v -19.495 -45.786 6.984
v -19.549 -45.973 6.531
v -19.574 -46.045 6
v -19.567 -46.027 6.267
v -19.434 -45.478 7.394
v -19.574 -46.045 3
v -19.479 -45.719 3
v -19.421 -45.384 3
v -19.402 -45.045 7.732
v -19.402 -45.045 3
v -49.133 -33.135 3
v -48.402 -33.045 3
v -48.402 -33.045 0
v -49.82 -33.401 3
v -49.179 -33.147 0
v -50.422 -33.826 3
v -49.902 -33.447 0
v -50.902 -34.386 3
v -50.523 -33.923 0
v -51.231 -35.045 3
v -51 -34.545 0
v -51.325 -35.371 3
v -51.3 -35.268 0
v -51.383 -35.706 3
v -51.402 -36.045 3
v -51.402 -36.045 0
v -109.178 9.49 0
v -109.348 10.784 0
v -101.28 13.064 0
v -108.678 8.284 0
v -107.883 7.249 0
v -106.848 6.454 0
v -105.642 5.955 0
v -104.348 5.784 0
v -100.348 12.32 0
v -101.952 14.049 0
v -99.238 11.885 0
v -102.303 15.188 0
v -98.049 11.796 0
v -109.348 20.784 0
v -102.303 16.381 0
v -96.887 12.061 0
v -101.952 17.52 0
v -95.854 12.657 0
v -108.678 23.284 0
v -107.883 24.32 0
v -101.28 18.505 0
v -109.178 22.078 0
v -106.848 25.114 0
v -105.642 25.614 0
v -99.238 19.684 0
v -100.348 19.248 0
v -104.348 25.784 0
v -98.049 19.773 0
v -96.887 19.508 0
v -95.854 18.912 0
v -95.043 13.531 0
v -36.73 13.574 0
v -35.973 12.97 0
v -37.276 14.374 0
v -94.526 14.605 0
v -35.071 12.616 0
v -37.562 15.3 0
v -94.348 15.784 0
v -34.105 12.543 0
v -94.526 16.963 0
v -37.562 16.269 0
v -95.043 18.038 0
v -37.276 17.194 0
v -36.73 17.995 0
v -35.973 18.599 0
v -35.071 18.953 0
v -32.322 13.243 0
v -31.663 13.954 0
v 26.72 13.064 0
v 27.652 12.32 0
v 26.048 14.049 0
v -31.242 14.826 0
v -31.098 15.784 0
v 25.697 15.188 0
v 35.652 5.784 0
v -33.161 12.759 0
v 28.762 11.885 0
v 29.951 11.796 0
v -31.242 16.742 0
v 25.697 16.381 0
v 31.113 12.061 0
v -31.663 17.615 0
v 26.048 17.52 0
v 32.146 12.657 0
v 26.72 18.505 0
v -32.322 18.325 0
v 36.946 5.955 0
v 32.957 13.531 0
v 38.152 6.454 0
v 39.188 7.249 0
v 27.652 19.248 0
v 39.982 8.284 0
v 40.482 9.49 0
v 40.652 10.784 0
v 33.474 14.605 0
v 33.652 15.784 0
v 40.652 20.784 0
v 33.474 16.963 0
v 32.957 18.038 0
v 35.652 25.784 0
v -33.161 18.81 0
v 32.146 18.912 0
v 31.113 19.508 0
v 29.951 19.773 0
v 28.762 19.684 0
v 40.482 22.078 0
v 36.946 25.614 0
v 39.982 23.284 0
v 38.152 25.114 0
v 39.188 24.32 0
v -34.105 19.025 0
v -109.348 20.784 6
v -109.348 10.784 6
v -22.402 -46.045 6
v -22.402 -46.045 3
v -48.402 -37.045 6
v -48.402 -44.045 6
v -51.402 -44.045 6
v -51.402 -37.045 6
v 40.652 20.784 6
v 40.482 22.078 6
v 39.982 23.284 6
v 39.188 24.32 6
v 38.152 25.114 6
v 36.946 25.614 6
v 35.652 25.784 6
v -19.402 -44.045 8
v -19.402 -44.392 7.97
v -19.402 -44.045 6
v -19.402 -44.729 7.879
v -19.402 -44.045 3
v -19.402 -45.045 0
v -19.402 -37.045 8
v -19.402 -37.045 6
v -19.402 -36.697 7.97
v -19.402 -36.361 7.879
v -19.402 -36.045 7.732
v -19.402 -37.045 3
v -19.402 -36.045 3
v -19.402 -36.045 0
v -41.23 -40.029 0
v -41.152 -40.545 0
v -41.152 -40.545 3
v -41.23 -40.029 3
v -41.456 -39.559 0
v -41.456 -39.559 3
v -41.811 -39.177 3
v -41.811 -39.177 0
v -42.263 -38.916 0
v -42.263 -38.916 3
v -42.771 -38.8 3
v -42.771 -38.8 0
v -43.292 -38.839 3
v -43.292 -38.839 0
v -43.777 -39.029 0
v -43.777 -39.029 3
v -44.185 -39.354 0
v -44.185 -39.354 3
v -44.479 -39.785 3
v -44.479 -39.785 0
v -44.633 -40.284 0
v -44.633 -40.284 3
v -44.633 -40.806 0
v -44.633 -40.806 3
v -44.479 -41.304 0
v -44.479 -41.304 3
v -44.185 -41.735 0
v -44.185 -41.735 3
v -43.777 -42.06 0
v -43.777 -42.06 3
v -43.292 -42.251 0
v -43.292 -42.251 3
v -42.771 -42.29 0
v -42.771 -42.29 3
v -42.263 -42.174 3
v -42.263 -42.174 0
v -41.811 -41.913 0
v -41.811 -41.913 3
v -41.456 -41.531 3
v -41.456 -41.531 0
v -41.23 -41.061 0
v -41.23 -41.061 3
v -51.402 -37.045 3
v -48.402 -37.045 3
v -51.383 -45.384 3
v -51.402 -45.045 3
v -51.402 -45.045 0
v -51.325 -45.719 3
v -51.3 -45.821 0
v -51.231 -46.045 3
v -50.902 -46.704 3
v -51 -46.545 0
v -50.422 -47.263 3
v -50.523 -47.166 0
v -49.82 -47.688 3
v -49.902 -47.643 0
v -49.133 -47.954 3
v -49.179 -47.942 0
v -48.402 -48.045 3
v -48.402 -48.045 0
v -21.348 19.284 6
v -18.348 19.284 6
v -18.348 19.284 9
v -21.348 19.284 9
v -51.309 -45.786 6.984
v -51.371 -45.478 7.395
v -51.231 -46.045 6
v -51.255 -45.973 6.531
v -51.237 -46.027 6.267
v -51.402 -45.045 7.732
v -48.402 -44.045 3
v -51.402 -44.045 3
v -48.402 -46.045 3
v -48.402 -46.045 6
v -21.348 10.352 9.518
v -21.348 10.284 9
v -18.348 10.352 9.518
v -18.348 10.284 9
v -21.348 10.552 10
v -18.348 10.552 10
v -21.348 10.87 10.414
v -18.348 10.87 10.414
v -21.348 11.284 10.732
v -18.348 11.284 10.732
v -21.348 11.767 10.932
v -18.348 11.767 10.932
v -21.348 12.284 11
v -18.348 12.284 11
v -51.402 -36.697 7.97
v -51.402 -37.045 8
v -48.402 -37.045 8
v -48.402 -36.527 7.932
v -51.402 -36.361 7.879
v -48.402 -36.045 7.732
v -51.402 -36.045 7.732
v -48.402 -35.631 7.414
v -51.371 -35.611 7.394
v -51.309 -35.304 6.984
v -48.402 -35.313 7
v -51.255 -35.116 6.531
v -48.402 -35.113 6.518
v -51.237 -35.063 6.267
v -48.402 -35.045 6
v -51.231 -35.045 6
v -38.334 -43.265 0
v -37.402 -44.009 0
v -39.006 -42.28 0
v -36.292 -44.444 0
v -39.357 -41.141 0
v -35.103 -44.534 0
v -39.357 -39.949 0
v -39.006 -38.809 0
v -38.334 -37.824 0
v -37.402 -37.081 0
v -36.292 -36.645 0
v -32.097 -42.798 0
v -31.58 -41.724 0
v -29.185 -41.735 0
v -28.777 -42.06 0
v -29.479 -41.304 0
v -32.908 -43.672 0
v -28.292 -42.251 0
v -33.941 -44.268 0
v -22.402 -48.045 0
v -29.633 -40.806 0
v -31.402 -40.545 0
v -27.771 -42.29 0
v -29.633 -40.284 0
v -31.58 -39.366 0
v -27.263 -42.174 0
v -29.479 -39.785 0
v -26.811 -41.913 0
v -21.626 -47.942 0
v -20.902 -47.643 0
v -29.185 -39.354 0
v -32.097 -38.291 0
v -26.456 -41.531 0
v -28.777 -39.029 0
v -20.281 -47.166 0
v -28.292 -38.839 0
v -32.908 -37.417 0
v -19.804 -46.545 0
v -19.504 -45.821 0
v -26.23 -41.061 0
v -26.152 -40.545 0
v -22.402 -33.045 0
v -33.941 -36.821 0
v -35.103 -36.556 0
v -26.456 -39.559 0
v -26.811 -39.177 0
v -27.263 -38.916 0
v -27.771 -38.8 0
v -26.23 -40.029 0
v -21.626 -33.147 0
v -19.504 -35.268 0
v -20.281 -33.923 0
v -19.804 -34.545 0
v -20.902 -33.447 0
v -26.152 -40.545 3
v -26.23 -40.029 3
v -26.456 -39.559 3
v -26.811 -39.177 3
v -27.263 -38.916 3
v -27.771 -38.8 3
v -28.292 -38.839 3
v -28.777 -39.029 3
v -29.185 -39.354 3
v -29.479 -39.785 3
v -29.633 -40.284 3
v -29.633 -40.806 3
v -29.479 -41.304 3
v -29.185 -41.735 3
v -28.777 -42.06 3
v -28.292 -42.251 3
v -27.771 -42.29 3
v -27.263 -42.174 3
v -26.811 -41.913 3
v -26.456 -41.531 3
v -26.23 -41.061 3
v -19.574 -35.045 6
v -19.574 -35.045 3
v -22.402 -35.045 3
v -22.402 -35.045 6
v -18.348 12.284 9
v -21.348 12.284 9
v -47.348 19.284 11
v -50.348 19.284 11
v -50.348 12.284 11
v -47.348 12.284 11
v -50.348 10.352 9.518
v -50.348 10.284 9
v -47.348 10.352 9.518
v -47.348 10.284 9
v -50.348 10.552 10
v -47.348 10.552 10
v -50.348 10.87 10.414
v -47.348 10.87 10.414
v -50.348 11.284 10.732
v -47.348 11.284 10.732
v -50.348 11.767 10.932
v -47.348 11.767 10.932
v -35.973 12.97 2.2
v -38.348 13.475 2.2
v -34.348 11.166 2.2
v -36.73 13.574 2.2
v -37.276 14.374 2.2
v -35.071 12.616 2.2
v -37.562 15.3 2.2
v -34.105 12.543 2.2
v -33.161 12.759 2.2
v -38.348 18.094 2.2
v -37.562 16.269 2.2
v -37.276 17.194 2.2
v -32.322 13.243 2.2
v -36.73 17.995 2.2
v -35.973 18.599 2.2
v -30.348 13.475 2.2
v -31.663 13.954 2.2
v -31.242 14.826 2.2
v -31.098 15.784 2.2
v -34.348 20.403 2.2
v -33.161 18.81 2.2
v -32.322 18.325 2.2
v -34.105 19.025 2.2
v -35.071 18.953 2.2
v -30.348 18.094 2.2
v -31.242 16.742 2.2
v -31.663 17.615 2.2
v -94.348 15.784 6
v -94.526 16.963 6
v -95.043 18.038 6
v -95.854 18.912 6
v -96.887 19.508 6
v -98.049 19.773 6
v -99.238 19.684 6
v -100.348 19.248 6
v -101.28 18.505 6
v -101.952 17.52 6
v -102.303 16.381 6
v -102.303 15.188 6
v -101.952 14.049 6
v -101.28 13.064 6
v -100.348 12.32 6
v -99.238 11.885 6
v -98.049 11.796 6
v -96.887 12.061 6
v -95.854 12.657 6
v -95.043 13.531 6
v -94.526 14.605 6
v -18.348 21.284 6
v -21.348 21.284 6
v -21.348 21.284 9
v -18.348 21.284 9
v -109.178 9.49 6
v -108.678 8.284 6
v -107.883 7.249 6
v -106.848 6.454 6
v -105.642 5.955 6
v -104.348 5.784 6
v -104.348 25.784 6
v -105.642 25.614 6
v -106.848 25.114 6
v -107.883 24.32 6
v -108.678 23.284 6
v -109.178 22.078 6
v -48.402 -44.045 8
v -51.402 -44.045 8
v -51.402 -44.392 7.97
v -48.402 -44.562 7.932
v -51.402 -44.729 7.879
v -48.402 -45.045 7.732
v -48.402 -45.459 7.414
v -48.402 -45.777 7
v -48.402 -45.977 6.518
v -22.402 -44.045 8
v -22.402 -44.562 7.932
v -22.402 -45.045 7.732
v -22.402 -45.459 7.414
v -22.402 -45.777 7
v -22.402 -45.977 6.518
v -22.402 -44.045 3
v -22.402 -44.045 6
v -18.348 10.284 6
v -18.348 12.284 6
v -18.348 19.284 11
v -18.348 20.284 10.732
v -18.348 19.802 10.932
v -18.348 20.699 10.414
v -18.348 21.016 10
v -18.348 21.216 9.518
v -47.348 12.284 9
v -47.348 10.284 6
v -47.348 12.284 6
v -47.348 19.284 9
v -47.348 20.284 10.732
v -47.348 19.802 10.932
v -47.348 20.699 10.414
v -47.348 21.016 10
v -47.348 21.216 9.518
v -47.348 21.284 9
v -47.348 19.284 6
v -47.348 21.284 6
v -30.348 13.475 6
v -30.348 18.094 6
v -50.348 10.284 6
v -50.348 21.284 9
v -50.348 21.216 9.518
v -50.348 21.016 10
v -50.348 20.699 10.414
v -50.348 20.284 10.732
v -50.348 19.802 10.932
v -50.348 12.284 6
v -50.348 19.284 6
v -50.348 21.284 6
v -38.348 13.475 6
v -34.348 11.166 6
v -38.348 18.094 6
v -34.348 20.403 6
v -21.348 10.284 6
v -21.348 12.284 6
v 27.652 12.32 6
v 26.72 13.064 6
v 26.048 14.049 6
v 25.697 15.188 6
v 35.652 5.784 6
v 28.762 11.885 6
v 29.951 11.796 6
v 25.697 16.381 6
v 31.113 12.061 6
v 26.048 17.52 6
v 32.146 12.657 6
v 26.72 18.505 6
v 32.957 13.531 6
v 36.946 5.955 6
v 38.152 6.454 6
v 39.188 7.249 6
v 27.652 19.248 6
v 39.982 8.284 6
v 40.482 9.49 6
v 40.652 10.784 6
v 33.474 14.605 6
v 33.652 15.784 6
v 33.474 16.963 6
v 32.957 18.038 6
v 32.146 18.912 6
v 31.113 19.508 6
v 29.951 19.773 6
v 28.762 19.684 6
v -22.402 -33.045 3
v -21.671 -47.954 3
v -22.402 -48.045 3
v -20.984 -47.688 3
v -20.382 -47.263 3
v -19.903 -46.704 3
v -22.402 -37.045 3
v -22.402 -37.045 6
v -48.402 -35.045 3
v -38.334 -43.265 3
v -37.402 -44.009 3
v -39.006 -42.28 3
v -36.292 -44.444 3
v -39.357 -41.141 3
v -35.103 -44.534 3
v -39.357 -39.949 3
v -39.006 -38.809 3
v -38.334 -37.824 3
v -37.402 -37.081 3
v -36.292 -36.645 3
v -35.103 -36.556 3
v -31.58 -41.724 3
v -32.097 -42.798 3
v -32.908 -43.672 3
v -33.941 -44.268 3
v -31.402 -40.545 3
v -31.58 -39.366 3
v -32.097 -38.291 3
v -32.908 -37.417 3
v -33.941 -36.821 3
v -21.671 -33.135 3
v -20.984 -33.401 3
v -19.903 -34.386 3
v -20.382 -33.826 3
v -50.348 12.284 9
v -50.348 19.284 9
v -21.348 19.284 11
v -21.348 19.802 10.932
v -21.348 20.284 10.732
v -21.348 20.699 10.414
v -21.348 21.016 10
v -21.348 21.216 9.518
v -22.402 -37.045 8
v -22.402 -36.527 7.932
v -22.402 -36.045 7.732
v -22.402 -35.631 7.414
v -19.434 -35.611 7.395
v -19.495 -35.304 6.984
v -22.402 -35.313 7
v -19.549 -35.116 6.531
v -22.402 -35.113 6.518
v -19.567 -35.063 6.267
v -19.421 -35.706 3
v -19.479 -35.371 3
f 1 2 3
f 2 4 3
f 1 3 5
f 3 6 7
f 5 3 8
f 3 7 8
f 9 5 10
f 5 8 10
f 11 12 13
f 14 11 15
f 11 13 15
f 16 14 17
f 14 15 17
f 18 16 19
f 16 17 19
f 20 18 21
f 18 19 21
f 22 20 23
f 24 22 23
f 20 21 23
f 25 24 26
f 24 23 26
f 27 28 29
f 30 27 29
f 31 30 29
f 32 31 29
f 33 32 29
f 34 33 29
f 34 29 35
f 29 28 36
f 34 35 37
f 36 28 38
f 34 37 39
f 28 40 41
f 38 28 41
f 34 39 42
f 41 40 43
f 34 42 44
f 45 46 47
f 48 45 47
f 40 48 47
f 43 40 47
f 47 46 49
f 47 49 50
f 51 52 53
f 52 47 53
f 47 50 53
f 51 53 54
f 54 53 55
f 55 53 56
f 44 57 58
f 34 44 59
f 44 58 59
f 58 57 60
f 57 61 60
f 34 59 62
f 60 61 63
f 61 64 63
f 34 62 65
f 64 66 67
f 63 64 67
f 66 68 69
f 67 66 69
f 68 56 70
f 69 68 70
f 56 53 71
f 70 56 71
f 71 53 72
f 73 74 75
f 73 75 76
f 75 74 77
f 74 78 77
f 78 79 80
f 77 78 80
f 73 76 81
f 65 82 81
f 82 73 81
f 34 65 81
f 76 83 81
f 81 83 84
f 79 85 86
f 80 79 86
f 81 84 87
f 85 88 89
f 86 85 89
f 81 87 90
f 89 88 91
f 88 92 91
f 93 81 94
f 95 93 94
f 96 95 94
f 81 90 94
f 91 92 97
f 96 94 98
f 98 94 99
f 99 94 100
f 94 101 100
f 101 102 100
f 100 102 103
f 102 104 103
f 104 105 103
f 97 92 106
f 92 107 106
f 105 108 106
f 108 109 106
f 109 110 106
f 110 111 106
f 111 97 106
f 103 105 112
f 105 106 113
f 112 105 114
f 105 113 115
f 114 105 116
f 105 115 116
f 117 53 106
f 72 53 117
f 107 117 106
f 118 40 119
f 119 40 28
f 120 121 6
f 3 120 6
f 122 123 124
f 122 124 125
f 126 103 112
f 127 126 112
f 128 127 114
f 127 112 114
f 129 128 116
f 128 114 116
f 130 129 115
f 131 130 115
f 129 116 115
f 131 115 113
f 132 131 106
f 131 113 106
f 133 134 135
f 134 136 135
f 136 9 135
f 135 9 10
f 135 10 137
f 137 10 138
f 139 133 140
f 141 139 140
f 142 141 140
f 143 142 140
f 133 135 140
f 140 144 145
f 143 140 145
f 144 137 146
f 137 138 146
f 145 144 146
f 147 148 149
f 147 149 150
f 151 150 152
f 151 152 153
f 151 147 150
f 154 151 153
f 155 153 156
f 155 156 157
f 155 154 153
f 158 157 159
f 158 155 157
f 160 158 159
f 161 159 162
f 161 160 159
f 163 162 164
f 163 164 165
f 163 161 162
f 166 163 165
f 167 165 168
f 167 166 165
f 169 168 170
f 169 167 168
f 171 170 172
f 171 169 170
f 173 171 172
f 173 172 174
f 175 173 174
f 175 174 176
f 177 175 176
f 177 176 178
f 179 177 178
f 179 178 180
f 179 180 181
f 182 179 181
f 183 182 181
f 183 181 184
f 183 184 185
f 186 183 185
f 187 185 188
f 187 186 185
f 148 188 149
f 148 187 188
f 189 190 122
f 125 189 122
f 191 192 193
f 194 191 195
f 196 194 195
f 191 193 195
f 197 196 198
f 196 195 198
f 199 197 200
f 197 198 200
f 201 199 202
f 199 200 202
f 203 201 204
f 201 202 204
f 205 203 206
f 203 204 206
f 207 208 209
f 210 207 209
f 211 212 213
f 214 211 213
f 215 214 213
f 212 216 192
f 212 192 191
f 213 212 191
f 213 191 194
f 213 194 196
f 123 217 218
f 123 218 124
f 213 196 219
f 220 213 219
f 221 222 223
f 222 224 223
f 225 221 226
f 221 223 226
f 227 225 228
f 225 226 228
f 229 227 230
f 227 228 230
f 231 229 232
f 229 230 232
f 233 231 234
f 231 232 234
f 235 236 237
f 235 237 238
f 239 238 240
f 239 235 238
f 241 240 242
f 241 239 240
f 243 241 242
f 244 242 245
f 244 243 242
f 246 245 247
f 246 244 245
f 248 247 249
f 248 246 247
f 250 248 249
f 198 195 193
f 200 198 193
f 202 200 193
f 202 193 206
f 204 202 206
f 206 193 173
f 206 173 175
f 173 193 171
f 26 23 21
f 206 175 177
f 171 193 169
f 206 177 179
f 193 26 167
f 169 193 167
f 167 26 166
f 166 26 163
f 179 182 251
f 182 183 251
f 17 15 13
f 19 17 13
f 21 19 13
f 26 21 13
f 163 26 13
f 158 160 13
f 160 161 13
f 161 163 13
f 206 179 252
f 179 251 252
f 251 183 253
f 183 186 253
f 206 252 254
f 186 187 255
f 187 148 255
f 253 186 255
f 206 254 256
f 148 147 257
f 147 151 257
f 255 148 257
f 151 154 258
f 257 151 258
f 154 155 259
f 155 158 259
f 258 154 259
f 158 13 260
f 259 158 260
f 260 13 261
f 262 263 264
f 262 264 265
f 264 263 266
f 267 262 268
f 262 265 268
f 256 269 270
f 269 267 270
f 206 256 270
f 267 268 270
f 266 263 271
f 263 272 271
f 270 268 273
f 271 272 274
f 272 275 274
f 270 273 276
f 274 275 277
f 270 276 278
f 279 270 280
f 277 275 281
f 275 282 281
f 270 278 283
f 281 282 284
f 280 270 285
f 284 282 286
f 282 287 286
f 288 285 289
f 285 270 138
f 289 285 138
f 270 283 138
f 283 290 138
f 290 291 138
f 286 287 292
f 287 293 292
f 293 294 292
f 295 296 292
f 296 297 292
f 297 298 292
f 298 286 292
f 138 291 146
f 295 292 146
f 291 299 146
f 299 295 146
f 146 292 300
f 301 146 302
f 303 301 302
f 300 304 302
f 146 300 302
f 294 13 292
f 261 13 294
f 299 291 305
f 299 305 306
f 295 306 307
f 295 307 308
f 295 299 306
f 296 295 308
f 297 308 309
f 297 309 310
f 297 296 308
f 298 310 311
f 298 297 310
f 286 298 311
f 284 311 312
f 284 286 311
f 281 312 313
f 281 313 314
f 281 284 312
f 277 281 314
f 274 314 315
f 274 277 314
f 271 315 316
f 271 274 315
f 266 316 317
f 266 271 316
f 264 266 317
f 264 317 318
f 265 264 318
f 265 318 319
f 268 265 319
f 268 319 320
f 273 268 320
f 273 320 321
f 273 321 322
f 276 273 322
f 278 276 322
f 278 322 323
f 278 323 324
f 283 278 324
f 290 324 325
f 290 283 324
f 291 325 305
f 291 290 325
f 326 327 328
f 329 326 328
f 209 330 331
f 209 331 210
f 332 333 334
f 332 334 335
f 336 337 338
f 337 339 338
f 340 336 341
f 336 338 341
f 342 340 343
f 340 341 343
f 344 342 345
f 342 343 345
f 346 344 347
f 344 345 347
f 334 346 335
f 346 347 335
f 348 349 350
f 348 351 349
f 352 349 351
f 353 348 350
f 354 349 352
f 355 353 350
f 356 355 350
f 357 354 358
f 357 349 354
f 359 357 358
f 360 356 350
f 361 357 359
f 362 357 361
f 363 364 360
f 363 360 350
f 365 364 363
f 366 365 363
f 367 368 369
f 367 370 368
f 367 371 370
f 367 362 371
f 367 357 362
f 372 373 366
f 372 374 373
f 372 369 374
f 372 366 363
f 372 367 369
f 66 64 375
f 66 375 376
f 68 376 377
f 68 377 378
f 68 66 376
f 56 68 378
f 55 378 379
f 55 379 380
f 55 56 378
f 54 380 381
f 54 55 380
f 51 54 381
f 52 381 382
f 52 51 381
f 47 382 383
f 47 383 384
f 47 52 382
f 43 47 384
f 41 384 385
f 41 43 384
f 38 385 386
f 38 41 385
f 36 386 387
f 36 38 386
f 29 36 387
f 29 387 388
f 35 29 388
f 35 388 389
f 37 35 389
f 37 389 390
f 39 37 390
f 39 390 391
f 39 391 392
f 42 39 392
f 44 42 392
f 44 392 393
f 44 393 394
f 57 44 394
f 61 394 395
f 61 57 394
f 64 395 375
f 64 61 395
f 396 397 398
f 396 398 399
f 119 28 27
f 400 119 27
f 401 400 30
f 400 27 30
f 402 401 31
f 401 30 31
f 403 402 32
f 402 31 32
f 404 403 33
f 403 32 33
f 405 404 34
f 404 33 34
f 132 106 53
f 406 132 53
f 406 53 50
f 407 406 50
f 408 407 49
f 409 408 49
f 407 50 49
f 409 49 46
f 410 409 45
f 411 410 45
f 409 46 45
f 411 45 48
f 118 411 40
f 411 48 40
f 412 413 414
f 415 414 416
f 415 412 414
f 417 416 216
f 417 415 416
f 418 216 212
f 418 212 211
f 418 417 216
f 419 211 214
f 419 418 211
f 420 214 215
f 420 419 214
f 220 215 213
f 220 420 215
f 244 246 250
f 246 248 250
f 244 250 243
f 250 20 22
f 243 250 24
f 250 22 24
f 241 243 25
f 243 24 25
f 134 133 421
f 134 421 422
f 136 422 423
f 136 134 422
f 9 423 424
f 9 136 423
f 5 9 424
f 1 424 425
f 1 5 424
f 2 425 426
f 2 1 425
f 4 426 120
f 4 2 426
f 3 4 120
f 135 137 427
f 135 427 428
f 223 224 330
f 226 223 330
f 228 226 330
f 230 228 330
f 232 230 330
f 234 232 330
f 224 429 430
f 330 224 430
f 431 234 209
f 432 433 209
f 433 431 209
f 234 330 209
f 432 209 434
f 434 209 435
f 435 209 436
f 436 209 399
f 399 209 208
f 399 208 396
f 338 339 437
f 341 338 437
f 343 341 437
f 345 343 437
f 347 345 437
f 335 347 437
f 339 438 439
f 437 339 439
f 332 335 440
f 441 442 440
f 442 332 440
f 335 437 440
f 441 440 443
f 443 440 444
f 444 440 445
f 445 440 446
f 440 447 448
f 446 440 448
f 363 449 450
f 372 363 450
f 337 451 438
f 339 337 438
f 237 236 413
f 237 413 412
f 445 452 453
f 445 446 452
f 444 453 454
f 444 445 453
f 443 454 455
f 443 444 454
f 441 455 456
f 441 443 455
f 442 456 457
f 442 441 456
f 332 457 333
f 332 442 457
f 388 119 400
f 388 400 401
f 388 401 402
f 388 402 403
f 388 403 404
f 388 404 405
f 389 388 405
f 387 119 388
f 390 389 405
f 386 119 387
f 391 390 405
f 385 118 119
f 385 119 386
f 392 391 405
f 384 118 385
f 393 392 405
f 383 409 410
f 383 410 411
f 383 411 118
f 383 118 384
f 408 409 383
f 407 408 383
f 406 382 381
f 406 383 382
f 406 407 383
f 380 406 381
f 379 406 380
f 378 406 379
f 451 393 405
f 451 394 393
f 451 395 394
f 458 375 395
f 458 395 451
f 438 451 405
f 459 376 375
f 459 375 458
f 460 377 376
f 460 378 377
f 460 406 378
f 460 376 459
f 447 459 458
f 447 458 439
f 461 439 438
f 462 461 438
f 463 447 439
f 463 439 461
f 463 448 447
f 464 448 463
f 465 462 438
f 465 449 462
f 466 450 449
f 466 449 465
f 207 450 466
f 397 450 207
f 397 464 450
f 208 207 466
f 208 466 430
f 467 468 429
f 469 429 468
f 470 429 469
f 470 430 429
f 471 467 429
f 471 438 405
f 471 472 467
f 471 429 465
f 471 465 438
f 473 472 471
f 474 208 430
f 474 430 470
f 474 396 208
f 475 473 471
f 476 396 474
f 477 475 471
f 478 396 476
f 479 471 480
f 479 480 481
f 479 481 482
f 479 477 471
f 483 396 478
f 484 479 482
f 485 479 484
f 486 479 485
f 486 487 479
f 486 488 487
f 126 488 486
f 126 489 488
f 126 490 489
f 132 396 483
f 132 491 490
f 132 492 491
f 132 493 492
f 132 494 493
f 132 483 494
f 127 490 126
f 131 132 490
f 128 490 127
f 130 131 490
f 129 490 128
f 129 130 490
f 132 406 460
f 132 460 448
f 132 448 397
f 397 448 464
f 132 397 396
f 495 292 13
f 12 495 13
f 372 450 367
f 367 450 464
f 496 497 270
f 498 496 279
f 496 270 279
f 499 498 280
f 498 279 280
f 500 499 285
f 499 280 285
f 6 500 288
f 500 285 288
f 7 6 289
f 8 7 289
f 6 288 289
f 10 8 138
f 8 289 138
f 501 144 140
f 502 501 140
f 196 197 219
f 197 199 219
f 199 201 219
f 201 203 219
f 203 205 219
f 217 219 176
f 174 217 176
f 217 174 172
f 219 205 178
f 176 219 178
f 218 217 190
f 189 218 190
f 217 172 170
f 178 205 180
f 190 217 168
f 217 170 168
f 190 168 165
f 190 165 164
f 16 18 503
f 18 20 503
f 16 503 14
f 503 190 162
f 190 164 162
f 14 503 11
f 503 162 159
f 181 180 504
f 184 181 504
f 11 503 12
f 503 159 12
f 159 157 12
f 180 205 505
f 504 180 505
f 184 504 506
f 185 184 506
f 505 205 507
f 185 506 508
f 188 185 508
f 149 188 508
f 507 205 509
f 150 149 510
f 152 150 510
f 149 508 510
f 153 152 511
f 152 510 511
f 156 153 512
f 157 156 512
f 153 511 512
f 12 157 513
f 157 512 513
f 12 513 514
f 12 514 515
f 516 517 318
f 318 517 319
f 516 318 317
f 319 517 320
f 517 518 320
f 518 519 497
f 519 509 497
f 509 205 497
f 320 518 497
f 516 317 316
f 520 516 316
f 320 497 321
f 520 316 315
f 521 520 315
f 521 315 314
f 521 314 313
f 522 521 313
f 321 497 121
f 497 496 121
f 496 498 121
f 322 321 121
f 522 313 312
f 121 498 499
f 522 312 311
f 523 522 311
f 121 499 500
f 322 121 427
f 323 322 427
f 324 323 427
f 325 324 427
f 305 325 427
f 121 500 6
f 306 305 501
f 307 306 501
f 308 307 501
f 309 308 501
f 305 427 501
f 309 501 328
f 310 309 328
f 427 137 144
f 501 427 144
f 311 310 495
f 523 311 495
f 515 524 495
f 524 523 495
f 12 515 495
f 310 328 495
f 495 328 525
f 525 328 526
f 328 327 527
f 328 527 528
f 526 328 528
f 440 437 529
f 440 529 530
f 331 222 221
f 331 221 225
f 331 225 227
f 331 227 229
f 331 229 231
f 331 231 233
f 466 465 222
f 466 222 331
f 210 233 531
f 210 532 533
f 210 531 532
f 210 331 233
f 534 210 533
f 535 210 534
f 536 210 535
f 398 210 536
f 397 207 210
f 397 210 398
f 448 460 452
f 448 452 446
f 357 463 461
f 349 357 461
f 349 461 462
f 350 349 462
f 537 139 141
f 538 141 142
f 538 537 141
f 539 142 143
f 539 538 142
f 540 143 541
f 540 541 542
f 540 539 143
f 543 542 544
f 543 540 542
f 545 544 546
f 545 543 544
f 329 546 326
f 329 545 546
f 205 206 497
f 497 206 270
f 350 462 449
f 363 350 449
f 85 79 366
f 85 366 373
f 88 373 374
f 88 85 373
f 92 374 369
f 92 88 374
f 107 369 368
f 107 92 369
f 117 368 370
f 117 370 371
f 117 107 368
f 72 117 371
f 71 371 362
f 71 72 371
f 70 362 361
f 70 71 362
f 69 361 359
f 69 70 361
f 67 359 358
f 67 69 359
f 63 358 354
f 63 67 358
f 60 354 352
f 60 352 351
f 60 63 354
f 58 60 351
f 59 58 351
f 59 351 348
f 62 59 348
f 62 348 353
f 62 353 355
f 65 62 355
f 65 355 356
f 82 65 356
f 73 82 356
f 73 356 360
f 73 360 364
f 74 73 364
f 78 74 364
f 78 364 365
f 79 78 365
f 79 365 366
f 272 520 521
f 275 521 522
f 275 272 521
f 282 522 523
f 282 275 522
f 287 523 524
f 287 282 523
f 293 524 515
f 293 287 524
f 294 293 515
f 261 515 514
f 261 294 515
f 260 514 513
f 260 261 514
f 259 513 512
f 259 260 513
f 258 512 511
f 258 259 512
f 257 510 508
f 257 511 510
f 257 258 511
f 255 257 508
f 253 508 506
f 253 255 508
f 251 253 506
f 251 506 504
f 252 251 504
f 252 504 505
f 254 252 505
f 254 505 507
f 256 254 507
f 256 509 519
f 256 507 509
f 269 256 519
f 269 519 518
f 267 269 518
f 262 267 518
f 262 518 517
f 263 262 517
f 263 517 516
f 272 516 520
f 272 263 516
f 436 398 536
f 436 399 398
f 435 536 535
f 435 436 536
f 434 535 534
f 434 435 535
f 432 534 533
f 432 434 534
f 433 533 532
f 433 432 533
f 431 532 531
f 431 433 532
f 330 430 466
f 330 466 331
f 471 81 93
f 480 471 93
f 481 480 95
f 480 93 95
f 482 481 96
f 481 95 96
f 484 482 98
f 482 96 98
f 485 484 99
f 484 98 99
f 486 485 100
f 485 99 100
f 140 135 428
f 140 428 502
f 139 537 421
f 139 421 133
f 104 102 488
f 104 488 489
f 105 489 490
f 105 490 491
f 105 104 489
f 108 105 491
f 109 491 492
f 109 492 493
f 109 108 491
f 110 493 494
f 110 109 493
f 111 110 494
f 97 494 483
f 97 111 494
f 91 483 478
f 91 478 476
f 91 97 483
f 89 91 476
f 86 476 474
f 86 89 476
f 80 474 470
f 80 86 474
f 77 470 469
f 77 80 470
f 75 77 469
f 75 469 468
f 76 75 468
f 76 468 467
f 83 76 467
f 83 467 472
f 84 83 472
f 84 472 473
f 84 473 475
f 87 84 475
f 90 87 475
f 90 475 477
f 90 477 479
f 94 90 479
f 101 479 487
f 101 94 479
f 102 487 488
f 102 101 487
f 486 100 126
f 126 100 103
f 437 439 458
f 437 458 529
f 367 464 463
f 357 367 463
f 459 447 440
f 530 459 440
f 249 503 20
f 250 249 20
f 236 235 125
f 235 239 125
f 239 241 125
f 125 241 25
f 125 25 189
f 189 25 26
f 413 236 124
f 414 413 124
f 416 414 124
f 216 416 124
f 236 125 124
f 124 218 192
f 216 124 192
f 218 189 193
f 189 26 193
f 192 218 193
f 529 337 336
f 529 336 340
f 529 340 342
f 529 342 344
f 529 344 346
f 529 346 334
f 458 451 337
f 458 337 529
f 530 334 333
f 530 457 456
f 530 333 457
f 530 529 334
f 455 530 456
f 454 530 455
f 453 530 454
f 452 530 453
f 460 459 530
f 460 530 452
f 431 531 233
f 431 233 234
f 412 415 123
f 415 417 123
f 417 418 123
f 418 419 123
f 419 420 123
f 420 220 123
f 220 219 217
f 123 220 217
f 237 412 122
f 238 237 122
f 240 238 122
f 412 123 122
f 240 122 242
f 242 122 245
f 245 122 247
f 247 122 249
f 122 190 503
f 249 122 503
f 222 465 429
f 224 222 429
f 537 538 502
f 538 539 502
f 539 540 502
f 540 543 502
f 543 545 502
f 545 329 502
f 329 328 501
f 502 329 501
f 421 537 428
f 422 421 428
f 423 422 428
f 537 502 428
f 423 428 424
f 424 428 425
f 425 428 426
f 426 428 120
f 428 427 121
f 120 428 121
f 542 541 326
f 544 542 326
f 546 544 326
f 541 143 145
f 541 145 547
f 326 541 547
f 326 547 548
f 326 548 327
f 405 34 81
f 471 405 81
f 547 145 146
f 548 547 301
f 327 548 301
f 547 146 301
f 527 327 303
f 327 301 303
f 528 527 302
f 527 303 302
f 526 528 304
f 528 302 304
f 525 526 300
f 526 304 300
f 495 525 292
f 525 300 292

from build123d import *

# Parameters (mm, degrees)
F0_R      = 4
F0_R_2    = 3.25
F1_DEPTH  = 6
F2_R      = 3.25
F3_DEPTH  = 3.8
F2_W      = 3
F2_H      = 11
F4_DEPTH  = 5
F5_R      = 2
F6_W      = 7
F6_H      = 3
F7_DEPTH  = 35
F8_R      = 1.75
F8_R_2    = 4
F9_DEPTH  = 3
F11_DEPTH = 5
F12_W     = 7
F12_H     = 3
F13_DEPTH = 35
F14_R     = 2


with BuildPart() as f1:
    # F0 (on Top) → F1 (new body)
    with BuildSketch(Plane.XY):
        with BuildLine():
            Line((35.652044, 25.784345), (-104.347956, 25.784345))
            ThreePointArc((-104.347956, 25.784345), (-107.88349, 24.319879), (-109.347956, 20.784345))
            Line((-109.347956, 20.784345), (-109.347956, 10.784345))
            ThreePointArc((-109.347956, 10.784345), (-107.88349, 7.248811), (-104.347956, 5.784345))
            Line((-104.347956, 5.784345), (35.652044, 5.784345))
            ThreePointArc((35.652044, 5.784345), (39.187578, 7.248811), (40.652044, 10.784345))
            Line((40.652044, 10.784345), (40.652044, 20.784345))
            ThreePointArc((40.652044, 20.784345), (39.187578, 24.319879), (35.652044, 25.784345))
        make_face()
        with Locations((-98.347956, 15.784345)):
            Circle(F0_R, mode=Mode.SUBTRACT)
        with Locations((-34.347956, 15.784345)):
            Circle(F0_R_2, mode=Mode.SUBTRACT)
        with Locations((29.652044, 15.784345)):
            Circle(F0_R, mode=Mode.SUBTRACT)
    extrude(amount=F1_DEPTH)

    # F2 (on face) → F3 (cut)
    with BuildSketch(Plane.XY.offset(6)):
        Polygon((-30.347956, 13.474944), (-30.347956, 18.093746), (-34.347956, 20.403147), (-38.347956, 18.093746), (-38.347956, 13.474944), (-34.347956, 11.165543), align=None)
        with Locations((-34.347956, 15.784345)):
            Circle(F2_R, mode=Mode.SUBTRACT)
    extrude(amount=-F3_DEPTH, mode=Mode.SUBTRACT)

    # F2 (on face) → F4 (join)
    with BuildSketch(Plane.XY.offset(6)):
        with Locations((-19.847956, 15.784345)):
            Rectangle(F2_W, F2_H)
        with Locations((-48.847956, 15.784345)):
            Rectangle(F2_W, F2_H)
    extrude(amount=F4_DEPTH)

    # F5
    f5_edges = [f1.edges().sort_by_distance(p)[0] for p in [
        (-19.847956, 21.284345, 11),
        (-19.847956, 10.284345, 11),
        (-48.847956, 21.284345, 11),
        (-48.847956, 10.284345, 11),
    ]]
    fillet(f5_edges, radius=F5_R)

    # F6 (on face) → F7 (cut)
    with BuildSketch(Plane.YZ.offset(-18.347956)):
        with Locations((15.784345, 7.5)):
            Rectangle(F6_W, F6_H)
    extrude(amount=-F7_DEPTH, mode=Mode.SUBTRACT)


with BuildPart() as f9:
    # F8 (on Top) → F9 (new body)
    with BuildSketch(Plane.XY):
        with BuildLine():
            Line((-22.402144, -33.044718), (-48.402144, -33.044718))
            ThreePointArc((-48.402144, -33.044718), (-50.523464, -33.923398), (-51.402144, -36.044718))
            Line((-51.402144, -36.044718), (-51.402144, -45.044718))
            ThreePointArc((-51.402144, -45.044718), (-50.523464, -47.166039), (-48.402144, -48.044718))
            Line((-48.402144, -48.044718), (-22.402144, -48.044718))
            ThreePointArc((-22.402144, -48.044718), (-20.280824, -47.166039), (-19.402144, -45.044718))
            Line((-19.402144, -45.044718), (-19.402144, -36.044718))
            ThreePointArc((-19.402144, -36.044718), (-20.280824, -33.923398), (-22.402144, -33.044718))
        make_face()
        with Locations((-42.902144, -40.544718)):
            Circle(F8_R, mode=Mode.SUBTRACT)
        with Locations((-35.402144, -40.544718)):
            Circle(F8_R_2, mode=Mode.SUBTRACT)
        with Locations((-27.902144, -40.544718)):
            Circle(F8_R, mode=Mode.SUBTRACT)
    extrude(amount=F9_DEPTH)

    # F10 (on face) → F11 (join)
    with BuildSketch(Plane.XY.offset(3)):
        with BuildLine():
            ThreePointArc((-19.402144, -36.044718), (-19.445348, -35.537413), (-19.573717, -35.044718))
            Line((-19.573717, -35.044718), (-22.402144, -35.044718))
            Line((-22.402144, -35.044718), (-22.402144, -46.044718))
            Line((-22.402144, -46.044718), (-19.573717, -46.044718))
            ThreePointArc((-19.573717, -46.044718), (-19.445348, -45.552024), (-19.402144, -45.044718))
            Line((-19.402144, -45.044718), (-19.402144, -36.044718))
        make_face()
        with BuildLine():
            Line((-48.402144, -35.044718), (-51.230571, -35.044718))
            ThreePointArc((-51.230571, -35.044718), (-51.35894, -35.537413), (-51.402144, -36.044718))
            Line((-51.402144, -36.044718), (-51.402144, -45.044718))
            ThreePointArc((-51.402144, -45.044718), (-51.35894, -45.552024), (-51.230571, -46.044718))
            Line((-51.230571, -46.044718), (-48.402144, -46.044718))
            Line((-48.402144, -46.044718), (-48.402144, -35.044718))
        make_face()
    extrude(amount=F11_DEPTH)

    # F12 (on face) → F13 (cut)
    with BuildSketch(Plane.YZ.offset(-19.402144)):
        with Locations((-40.544718, 4.5)):
            Rectangle(F12_W, F12_H)
    extrude(amount=-F13_DEPTH, mode=Mode.SUBTRACT)

    # F14
    f14_edges = [f9.edges().sort_by_distance(p)[0] for p in [
        (-20.987931, -46.044718, 8),
        (-49.816358, -46.044718, 8),
        (-49.816358, -35.044718, 8),
        (-20.987931, -35.044718, 8),
    ]]
    fillet(f14_edges, radius=F14_R)


solid = Compound([f1.part, f9.part])
